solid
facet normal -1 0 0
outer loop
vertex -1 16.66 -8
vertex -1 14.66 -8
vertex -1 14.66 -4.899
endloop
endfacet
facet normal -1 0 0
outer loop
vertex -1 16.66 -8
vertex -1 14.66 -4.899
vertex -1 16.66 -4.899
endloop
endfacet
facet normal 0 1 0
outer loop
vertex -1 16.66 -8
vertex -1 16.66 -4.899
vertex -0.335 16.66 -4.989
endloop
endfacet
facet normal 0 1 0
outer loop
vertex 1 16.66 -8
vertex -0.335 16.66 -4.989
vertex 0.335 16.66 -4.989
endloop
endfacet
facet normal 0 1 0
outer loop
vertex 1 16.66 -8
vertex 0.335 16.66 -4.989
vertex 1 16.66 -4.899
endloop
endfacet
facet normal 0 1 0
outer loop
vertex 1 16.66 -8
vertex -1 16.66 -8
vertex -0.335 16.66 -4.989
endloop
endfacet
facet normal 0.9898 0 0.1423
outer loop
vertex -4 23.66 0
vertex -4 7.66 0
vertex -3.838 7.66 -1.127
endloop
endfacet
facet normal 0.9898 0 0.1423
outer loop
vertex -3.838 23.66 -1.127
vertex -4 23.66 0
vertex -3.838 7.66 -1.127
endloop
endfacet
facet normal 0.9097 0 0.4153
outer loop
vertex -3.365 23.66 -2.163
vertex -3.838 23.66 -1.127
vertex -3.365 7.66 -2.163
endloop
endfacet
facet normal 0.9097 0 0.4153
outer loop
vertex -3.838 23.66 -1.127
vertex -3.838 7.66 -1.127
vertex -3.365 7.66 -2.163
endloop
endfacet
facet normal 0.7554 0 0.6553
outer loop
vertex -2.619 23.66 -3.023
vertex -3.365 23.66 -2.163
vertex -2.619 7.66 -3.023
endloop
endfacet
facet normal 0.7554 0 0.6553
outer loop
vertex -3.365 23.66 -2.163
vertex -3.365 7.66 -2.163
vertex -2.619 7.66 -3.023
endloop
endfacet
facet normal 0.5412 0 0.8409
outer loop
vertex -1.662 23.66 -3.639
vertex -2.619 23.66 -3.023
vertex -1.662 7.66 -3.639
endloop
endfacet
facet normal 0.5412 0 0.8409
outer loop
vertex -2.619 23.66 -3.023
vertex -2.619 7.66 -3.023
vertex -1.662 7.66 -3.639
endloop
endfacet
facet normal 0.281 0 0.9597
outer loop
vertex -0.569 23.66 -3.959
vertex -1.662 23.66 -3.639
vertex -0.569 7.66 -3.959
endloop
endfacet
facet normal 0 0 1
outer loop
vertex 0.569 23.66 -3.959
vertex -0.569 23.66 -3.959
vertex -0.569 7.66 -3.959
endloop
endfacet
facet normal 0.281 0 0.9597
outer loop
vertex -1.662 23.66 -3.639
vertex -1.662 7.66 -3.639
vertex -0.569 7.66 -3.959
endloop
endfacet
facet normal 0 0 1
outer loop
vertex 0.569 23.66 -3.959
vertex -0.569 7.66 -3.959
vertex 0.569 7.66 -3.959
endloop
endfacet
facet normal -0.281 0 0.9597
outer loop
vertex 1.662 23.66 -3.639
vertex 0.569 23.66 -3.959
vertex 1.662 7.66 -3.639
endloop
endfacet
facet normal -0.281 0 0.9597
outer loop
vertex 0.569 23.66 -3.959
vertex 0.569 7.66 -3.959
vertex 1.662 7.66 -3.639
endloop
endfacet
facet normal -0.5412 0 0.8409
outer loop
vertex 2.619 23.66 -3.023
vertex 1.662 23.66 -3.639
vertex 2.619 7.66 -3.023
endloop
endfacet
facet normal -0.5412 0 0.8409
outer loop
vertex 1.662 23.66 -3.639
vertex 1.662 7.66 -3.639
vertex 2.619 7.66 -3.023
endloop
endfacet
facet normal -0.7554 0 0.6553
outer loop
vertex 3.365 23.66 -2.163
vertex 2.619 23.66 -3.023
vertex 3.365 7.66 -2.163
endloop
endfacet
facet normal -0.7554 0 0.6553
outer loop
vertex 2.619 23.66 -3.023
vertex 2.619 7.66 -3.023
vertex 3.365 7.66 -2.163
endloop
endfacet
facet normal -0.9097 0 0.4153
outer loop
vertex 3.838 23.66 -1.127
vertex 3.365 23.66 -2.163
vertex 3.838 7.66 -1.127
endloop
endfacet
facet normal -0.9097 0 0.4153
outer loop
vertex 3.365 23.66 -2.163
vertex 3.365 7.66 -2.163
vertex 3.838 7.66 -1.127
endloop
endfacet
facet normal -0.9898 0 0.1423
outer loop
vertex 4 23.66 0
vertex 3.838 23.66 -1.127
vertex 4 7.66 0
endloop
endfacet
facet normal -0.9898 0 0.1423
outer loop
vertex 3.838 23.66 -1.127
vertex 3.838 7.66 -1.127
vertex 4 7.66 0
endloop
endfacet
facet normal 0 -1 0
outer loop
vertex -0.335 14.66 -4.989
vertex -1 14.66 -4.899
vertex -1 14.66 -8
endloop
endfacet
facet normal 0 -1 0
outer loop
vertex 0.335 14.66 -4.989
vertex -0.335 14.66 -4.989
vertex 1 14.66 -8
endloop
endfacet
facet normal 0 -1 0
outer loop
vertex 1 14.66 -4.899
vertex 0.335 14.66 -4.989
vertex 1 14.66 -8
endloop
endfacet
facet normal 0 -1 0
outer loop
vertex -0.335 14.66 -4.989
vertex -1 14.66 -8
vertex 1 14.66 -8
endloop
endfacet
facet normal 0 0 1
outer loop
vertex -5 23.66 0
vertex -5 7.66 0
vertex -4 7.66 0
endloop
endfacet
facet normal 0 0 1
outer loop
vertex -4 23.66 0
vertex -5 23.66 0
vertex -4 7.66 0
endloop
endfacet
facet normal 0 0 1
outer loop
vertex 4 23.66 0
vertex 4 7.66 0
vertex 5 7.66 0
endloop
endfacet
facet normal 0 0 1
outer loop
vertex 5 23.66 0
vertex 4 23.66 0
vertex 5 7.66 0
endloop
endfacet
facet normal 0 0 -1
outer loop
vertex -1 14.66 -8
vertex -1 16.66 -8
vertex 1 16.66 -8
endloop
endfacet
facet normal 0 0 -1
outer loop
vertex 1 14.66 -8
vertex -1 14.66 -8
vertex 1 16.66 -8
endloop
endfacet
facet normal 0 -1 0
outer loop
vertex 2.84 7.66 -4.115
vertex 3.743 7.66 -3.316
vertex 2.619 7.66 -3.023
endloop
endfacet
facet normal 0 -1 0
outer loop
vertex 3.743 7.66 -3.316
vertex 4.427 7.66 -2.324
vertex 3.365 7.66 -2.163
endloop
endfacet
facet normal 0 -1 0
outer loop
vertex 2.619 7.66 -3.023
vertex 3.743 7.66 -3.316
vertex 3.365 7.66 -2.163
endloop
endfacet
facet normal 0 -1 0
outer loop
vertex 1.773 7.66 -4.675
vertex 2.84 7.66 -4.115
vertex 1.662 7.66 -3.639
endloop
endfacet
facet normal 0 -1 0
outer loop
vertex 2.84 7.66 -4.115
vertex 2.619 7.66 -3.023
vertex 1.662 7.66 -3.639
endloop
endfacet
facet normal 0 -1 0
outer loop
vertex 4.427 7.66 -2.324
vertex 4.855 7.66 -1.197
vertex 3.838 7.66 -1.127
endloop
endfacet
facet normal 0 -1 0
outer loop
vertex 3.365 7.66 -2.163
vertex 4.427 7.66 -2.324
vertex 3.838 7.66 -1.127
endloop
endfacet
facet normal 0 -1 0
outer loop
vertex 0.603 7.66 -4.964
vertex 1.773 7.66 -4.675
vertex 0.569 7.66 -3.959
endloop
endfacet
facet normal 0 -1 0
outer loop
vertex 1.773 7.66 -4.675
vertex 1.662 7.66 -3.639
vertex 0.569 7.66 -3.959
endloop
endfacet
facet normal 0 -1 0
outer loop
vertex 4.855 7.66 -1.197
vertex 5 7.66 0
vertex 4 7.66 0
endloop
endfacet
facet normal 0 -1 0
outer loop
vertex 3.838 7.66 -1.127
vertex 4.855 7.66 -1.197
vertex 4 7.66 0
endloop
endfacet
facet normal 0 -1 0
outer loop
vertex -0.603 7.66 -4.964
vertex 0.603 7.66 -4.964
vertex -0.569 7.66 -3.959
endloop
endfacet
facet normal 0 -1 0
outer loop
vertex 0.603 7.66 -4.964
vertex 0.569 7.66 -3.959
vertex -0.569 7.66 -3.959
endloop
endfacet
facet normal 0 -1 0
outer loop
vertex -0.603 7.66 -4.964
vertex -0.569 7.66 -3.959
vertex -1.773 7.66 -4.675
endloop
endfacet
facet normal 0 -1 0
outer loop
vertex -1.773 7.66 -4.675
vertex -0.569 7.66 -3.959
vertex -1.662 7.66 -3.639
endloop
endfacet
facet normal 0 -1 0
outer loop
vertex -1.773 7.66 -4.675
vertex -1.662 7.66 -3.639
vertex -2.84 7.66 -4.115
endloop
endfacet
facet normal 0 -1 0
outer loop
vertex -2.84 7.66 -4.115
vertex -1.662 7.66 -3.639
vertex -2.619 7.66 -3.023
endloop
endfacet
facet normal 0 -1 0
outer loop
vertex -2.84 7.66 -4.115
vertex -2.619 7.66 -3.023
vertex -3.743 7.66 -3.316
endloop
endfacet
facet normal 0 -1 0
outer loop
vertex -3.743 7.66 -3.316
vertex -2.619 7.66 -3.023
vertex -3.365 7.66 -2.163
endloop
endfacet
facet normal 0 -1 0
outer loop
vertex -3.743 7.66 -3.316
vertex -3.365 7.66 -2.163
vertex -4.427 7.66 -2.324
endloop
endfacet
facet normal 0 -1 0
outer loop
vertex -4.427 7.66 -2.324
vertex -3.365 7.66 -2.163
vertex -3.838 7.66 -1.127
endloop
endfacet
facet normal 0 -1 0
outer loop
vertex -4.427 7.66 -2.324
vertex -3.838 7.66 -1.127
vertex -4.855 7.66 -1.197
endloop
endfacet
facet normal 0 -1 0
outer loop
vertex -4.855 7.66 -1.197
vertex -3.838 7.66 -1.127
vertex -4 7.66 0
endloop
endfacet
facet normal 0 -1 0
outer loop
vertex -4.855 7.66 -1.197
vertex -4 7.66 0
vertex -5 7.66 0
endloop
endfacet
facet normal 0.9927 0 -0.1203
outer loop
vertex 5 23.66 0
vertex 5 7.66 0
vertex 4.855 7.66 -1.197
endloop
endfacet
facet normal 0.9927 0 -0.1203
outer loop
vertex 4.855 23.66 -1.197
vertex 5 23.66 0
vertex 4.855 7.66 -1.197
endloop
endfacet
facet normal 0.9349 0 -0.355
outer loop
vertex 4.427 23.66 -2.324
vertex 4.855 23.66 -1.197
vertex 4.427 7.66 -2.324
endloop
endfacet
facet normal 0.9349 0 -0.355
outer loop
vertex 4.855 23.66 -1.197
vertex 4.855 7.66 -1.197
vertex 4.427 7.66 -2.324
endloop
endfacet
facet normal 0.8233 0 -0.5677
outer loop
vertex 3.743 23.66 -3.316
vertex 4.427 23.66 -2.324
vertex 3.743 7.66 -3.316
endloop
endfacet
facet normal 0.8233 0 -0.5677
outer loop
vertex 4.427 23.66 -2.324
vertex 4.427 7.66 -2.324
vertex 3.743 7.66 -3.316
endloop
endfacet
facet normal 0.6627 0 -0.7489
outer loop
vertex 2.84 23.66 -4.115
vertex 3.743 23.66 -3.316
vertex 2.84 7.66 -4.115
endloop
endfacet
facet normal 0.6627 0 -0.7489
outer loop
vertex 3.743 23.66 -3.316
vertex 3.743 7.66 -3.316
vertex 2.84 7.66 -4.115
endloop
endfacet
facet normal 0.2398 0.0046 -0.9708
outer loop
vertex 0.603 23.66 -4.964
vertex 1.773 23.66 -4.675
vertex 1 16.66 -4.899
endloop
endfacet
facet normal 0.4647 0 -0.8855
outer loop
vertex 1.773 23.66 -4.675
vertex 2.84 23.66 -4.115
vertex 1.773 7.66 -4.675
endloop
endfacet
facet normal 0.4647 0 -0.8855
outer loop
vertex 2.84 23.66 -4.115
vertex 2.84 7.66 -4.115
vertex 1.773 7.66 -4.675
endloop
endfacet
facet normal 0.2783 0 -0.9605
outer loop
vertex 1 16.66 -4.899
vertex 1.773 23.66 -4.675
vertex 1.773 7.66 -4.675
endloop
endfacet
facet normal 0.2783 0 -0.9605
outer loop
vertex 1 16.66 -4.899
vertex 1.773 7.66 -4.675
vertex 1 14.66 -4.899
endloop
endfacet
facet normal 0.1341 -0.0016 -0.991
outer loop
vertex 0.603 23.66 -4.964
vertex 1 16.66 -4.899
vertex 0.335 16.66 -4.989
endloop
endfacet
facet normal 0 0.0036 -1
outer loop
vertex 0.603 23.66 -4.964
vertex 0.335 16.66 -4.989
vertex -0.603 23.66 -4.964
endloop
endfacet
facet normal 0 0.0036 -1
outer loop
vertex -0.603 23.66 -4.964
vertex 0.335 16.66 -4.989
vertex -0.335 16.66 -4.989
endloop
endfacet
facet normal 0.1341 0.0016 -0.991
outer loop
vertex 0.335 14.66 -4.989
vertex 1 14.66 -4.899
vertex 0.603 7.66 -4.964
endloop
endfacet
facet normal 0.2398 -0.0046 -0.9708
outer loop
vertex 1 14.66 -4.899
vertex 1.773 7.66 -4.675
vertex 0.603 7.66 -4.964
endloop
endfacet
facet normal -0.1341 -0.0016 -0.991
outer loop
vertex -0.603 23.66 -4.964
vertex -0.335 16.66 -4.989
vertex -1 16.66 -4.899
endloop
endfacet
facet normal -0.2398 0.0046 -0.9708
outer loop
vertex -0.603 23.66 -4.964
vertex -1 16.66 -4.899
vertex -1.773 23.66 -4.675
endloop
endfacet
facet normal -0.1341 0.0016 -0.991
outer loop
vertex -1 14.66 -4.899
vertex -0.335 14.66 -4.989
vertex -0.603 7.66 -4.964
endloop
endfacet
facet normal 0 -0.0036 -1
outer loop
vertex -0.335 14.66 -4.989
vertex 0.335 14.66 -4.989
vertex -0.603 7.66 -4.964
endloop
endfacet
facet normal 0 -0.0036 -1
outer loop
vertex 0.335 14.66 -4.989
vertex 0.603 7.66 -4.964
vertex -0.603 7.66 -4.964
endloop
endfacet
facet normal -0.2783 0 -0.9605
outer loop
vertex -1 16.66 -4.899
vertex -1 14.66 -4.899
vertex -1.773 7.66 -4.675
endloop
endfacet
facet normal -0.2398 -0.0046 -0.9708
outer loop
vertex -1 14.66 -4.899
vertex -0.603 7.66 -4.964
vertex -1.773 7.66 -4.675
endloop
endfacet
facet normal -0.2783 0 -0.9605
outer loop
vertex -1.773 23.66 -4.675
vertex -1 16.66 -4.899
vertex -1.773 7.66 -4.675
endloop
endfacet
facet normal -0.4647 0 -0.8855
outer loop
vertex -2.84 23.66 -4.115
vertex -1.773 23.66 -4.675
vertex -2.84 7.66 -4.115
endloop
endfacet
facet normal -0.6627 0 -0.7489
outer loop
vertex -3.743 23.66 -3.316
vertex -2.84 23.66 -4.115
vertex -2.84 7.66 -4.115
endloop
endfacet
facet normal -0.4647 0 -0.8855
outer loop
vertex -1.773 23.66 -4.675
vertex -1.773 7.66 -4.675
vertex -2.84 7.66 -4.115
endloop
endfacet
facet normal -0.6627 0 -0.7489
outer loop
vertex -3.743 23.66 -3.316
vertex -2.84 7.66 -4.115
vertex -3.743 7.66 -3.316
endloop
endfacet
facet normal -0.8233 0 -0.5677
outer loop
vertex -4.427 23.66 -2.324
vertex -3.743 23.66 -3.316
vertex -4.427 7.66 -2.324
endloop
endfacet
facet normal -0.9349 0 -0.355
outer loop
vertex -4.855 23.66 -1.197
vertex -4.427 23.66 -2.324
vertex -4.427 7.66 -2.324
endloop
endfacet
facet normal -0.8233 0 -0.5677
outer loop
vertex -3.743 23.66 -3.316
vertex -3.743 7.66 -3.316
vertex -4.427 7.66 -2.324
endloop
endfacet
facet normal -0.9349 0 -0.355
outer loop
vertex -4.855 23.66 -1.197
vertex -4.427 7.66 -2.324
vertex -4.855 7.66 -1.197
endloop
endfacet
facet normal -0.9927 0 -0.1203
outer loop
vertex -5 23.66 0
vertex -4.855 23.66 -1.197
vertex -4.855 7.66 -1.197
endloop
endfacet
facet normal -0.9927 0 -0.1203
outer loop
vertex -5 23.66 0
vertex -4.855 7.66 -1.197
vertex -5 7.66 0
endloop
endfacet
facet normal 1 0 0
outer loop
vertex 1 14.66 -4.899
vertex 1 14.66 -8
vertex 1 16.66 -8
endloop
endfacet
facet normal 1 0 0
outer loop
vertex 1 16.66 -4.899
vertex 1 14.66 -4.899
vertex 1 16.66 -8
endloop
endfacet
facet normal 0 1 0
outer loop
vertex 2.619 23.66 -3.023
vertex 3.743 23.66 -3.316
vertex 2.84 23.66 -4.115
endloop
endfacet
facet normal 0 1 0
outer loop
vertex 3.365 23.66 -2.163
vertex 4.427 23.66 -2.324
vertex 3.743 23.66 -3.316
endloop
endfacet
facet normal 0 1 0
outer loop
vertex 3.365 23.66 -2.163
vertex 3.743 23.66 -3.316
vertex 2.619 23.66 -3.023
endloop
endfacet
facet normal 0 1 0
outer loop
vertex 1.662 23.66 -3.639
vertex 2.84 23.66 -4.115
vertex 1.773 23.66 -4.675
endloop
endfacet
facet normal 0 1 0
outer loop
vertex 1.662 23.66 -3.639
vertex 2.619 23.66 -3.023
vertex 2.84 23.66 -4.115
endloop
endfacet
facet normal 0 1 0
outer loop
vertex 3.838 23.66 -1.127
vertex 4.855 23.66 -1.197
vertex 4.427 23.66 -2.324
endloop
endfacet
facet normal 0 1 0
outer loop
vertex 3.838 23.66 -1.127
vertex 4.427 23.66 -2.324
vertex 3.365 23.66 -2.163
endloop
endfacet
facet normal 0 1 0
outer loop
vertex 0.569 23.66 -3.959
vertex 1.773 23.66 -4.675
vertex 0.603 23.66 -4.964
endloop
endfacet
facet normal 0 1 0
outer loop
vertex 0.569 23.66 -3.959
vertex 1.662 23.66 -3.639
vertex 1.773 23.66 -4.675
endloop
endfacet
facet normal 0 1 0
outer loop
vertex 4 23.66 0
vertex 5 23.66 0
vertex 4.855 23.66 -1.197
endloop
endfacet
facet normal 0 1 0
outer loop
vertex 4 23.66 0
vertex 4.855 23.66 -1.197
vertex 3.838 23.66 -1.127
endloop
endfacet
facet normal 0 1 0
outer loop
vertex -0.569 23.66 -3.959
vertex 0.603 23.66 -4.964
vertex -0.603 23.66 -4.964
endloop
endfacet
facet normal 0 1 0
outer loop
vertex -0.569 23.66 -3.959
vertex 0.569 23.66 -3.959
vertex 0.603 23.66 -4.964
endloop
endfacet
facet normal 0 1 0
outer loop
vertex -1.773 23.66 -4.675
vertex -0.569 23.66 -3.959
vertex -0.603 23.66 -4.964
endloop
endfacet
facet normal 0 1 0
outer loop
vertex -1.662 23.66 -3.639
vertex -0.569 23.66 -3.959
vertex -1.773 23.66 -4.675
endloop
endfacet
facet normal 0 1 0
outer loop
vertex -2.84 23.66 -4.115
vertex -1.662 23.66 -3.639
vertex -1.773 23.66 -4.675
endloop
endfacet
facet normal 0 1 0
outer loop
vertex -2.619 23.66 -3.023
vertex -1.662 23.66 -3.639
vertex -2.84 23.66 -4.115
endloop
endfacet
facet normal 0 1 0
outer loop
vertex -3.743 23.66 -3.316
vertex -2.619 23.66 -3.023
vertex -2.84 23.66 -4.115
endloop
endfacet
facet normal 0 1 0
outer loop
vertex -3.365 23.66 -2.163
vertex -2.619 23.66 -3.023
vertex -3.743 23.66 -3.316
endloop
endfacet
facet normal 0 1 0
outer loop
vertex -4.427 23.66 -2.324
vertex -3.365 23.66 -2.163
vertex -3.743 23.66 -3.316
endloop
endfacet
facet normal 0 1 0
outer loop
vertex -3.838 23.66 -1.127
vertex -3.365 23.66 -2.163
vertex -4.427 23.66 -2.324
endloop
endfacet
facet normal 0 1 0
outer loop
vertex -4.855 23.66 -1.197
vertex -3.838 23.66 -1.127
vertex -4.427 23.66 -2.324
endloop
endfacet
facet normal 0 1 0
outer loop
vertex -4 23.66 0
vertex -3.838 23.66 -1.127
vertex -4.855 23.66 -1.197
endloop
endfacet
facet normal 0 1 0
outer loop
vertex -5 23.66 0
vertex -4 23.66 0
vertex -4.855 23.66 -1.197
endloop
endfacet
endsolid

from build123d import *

# Parameters (mm, degrees)
BOSS_EXTRU_3_DEPTH      = 16
BOSS_EXTRU_4_REACH      = 27.471
BOSS_EXTRU_4_END_RADIUS = 5
ESQUISSE4_W             = 2
ESQUISSE4_H             = 2


with BuildPart() as part:
    # Esquisse3 → Boss.-Extru.3 (new body)
    with BuildSketch(Plane(origin=(0, 7.659672056, 0), x_dir=(-1, 0, 0), z_dir=(0, 1, 0))):
        with BuildLine():
            Line((-4, 0), (-5, 0))
            ThreePointArc((-5, 0), (0, -5), (5, 0))
            Line((5, 0), (4, 0))
            ThreePointArc((4, 0), (0, -4), (-4, 0))
        make_face()
    extrude(amount=BOSS_EXTRU_3_DEPTH)

    # Boss.-Extru.4: up to this cylinder (the profile starts outside it)
    boss_extru_4_end = Plane(origin=(0, 15.659672, 0), z_dir=(0, -1, 0)) * Cylinder(BOSS_EXTRU_4_END_RADIUS, 65.942, mode=Mode.PRIVATE)
    # Esquisse4 → Boss.-Extru.4 (add, up to the surface)
    with BuildSketch(Plane.XY.offset(-8), mode=Mode.PRIVATE) as boss_extru_4_sk1:
        with Locations((0, 15.659672056)):
            Rectangle(ESQUISSE4_W, ESQUISSE4_H)
    boss_extru_4_tool1 = extrude(boss_extru_4_sk1.sketch, amount=BOSS_EXTRU_4_REACH, mode=Mode.PRIVATE) - boss_extru_4_end
    add(boss_extru_4_tool1.solids().sort_by_distance((0, 15.659672, -8))[0])


solid = part.part
